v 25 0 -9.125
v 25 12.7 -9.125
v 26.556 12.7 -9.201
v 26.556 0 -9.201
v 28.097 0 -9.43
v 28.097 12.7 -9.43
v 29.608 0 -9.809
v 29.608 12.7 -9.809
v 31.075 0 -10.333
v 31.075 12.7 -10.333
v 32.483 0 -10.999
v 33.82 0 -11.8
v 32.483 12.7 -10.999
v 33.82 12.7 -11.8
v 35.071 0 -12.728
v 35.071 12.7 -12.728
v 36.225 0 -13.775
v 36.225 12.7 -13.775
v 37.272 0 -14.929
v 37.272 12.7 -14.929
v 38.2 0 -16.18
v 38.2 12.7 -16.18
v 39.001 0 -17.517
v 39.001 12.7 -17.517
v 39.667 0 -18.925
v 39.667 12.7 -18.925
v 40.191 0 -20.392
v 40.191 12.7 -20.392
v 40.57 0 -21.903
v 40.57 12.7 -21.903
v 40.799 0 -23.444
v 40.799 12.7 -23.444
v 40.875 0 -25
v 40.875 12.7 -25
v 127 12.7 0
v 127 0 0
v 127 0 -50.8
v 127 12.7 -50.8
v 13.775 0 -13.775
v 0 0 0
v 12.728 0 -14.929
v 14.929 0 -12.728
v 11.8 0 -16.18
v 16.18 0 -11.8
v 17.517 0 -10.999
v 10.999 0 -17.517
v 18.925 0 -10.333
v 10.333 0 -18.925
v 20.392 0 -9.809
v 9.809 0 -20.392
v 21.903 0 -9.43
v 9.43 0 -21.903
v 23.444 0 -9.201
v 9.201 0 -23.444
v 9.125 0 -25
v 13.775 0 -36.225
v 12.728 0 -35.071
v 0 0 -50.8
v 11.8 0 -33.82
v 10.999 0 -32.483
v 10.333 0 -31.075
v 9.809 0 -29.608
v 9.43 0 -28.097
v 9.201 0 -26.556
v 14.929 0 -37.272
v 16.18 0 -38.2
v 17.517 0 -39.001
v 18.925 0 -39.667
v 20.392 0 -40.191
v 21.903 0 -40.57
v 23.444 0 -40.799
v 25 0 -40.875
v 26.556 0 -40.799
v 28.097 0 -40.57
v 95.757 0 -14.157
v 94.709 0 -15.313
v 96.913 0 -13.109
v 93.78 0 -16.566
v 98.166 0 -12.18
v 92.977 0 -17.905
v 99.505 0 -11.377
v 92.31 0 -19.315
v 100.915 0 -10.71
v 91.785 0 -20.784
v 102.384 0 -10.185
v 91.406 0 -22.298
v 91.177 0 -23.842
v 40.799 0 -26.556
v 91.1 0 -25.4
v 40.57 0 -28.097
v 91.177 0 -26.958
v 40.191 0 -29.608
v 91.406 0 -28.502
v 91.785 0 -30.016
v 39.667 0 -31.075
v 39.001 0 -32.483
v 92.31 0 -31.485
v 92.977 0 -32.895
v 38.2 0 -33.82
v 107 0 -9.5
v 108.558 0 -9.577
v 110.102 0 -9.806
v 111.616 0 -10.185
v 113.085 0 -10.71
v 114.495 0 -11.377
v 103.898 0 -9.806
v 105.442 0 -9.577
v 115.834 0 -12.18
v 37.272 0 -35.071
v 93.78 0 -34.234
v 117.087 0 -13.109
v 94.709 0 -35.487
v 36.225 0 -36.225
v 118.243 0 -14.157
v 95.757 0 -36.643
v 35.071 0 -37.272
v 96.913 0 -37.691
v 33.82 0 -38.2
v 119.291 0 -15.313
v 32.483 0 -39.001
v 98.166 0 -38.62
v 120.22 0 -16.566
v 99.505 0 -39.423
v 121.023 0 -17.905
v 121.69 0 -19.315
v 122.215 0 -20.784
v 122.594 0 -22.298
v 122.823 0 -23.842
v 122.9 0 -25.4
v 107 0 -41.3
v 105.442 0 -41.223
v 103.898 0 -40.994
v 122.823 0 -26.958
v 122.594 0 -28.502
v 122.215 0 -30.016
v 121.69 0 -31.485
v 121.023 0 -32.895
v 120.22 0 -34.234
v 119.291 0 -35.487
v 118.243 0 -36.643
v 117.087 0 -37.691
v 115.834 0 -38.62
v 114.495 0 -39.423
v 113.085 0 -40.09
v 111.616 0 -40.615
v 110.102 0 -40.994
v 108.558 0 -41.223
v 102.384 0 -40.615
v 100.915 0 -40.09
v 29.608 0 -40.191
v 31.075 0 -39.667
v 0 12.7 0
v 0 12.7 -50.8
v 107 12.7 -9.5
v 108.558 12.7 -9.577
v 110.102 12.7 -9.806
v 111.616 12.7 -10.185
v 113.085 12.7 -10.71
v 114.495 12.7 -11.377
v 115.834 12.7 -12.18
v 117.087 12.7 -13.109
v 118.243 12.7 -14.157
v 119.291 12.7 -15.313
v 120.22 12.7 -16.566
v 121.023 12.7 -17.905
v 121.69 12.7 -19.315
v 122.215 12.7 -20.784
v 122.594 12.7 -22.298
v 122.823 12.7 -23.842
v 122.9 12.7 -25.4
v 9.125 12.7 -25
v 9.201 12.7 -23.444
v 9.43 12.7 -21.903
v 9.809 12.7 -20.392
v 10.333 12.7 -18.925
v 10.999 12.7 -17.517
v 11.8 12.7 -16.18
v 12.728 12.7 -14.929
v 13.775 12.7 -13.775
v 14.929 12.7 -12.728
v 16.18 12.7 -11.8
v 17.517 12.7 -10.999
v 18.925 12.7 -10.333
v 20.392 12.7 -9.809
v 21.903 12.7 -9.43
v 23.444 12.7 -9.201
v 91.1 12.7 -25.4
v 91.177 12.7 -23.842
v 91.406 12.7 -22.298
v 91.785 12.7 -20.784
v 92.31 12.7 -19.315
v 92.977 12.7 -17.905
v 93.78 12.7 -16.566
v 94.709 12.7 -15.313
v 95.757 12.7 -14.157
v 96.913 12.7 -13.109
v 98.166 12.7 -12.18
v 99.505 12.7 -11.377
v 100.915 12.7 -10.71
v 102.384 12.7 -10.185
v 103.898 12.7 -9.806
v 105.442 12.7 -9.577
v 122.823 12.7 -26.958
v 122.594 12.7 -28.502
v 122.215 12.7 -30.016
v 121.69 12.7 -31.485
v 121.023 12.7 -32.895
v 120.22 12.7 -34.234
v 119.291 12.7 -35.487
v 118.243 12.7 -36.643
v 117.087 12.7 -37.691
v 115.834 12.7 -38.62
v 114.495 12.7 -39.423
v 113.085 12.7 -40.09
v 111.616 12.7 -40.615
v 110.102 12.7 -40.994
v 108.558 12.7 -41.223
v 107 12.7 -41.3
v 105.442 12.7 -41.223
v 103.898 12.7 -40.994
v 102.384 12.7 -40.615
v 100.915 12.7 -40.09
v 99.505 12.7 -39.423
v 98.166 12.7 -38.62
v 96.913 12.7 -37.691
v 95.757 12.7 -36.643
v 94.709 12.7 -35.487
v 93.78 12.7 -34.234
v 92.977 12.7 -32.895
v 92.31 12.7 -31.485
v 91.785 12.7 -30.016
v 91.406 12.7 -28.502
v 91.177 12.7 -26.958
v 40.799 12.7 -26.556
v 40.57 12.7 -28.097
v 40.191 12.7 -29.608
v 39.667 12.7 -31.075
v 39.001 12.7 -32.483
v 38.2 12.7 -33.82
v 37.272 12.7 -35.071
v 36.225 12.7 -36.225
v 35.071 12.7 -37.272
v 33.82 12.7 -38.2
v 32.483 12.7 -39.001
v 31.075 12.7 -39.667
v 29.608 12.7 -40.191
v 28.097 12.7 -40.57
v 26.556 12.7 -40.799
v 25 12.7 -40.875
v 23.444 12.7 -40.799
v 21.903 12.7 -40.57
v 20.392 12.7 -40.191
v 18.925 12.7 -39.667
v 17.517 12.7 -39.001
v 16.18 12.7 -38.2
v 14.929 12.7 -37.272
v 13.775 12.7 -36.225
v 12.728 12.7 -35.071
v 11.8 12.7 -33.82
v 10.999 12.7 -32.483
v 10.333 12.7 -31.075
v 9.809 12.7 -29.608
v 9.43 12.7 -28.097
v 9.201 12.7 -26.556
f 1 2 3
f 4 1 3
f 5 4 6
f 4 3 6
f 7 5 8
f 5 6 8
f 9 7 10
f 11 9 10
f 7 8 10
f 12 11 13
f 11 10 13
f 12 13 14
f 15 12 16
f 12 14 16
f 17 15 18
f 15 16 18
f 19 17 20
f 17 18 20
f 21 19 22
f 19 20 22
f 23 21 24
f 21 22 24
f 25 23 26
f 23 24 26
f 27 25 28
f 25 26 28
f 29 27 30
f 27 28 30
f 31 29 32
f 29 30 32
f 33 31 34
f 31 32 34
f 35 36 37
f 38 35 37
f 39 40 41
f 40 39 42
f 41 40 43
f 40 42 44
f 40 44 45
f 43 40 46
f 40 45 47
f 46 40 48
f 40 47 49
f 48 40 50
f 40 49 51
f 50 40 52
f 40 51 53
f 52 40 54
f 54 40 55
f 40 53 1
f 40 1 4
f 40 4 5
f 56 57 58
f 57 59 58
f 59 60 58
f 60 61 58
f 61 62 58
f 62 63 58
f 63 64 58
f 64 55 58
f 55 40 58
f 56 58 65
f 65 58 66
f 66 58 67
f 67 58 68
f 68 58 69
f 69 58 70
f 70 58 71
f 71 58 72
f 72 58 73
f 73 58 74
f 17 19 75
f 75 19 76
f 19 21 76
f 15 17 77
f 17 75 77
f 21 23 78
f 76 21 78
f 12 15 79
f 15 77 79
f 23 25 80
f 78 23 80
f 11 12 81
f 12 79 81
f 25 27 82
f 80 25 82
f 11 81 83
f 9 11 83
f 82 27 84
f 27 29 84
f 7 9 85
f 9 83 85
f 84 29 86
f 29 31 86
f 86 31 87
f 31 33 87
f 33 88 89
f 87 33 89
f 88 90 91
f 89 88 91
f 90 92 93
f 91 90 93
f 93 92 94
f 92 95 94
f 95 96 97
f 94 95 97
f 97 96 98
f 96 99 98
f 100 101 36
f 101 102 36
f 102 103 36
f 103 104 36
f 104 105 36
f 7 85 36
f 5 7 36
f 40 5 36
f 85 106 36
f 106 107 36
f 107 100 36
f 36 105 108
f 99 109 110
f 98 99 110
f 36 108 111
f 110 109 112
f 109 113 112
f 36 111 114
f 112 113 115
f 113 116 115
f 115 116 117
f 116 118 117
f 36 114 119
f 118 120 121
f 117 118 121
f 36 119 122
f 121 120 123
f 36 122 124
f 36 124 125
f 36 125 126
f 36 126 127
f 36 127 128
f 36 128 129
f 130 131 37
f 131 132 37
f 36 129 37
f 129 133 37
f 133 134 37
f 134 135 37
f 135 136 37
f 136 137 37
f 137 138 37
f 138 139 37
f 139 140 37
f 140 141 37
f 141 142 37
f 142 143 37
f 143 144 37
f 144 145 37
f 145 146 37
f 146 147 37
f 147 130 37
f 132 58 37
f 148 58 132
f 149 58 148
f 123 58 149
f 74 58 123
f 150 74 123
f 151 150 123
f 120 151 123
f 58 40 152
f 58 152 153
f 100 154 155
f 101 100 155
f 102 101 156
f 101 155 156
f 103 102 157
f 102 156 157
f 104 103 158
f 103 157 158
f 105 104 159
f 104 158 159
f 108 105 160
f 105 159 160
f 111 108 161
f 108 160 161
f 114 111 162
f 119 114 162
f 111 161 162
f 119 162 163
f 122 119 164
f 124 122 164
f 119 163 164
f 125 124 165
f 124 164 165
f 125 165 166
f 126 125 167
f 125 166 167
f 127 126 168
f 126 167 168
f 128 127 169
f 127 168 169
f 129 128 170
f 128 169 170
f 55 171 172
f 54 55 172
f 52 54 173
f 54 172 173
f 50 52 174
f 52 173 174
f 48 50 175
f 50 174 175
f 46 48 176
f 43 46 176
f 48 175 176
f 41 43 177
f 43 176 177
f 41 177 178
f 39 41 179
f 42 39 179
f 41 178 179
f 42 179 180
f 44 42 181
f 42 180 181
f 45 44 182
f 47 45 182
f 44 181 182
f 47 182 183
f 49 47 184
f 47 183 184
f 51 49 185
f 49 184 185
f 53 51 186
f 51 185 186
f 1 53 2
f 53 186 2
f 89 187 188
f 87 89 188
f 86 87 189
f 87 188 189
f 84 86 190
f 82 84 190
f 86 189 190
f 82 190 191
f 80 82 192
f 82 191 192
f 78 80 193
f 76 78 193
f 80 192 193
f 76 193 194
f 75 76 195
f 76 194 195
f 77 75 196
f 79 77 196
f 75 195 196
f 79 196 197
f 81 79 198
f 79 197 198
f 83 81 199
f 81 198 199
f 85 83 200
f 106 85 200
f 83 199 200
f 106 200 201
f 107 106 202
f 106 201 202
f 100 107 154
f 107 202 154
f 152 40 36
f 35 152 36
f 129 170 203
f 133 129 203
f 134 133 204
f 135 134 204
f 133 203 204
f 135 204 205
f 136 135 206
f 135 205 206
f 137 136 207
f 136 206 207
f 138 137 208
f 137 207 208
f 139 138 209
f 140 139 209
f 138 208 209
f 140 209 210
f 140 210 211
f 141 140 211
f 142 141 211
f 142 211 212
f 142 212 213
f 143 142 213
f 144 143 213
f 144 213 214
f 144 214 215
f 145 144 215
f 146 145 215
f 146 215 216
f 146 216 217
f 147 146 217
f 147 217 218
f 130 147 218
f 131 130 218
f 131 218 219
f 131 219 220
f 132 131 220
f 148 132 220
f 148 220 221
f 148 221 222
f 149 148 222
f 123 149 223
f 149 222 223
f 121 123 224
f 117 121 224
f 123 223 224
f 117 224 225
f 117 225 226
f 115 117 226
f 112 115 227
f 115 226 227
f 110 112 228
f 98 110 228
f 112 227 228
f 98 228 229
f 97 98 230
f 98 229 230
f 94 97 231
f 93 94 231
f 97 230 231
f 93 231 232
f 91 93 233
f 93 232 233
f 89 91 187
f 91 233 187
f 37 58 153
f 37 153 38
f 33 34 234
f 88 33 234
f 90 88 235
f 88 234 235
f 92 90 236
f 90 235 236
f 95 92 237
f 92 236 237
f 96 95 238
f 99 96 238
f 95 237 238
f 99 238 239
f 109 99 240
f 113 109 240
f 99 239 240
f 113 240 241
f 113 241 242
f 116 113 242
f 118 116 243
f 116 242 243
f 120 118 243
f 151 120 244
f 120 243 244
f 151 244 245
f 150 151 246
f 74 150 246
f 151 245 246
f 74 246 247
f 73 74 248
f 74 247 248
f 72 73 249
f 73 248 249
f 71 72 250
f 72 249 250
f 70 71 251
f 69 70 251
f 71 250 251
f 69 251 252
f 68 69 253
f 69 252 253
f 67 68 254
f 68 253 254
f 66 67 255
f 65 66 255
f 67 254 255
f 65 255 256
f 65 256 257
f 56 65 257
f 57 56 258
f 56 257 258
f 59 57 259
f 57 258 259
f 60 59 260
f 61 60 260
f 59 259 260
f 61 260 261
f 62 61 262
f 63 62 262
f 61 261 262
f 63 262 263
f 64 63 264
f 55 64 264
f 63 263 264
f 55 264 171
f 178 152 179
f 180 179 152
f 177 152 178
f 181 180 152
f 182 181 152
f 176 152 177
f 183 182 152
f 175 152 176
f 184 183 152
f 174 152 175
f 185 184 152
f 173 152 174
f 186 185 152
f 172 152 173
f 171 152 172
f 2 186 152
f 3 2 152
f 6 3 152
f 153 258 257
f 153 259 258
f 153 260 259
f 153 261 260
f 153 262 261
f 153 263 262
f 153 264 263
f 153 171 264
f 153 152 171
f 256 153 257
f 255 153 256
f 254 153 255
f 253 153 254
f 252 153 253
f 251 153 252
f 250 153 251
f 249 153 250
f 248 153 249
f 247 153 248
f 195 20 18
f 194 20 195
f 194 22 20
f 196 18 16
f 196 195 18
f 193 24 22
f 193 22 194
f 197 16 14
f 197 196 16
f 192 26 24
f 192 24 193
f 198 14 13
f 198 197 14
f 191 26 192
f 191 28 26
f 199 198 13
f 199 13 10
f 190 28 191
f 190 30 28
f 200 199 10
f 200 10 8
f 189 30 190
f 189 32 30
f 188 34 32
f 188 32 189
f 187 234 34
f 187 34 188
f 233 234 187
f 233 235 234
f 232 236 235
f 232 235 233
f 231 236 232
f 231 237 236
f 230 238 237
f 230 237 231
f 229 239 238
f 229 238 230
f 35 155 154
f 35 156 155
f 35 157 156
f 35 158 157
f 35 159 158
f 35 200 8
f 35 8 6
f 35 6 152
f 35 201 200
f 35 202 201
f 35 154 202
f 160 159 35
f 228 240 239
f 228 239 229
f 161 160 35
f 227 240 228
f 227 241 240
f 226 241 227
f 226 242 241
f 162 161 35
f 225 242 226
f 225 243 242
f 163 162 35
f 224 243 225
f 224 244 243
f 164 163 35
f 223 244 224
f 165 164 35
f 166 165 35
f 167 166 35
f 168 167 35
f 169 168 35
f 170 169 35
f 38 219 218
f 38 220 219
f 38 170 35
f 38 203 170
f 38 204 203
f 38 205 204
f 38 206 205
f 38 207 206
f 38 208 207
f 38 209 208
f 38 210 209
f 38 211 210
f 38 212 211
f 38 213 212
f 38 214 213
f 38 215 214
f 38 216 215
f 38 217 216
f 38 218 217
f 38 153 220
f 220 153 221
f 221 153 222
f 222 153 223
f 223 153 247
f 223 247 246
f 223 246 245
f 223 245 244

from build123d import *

# Parameters (mm, degrees)
SKETCH1_W           = 127
SKETCH1_H           = 50.8
BOSS_EXTRUDE1_DEPTH = 12.7
CUT_EXTRUDE1_DEPTH  = 12.7
CUT_EXTRUDE2_DEPTH  = 13.7


with BuildPart() as part:
    # Sketch1 → Boss-Extrude1 (new body)
    with BuildSketch(Plane(origin=(0, 0, 0), x_dir=(1, 0, 0), z_dir=(0, 1, 0))):
        with Locations((63.5, 25.4)):
            Rectangle(SKETCH1_W, SKETCH1_H)
    extrude(amount=BOSS_EXTRUDE1_DEPTH)

    # Sketch2 → Cut-Extrude1 (cut)
    with BuildSketch(Plane(origin=(0, 12.7, 0), x_dir=(1, 0, 0), z_dir=(0, 1, 0))):
        with BuildLine():
            ThreePointArc((9.125, 25), (13.774679849, 13.774679849), (25, 9.125))
            Line((25, 9.125), (25, 25))
            Line((25, 25), (9.125, 25))
        make_face()
        with BuildLine():
            Line((25, 25), (25, 9.125))
            ThreePointArc((25, 9.125), (36.225320151, 13.774679849), (40.875, 25))
            ThreePointArc((40.875, 25), (25, 40.875), (9.125, 25))
            Line((9.125, 25), (25, 25))
        make_face()
    extrude(amount=-CUT_EXTRUDE1_DEPTH, mode=Mode.SUBTRACT)

    # Sketch4 → Cut-Extrude2 (cut, through all)
    with BuildSketch(Plane(origin=(0, 12.7, 0), x_dir=(1, 0, 0), z_dir=(0, 1, 0))):
        with BuildLine():
            ThreePointArc((91.1, 25.4), (95.757002179, 14.157002179), (107, 9.5))
            Line((107, 9.5), (107, 25.4))
            Line((107, 25.4), (91.1, 25.4))
        make_face()
        with BuildLine():
            Line((107, 25.4), (107, 9.5))
            ThreePointArc((107, 9.5), (118.242997821, 14.157002179), (122.9, 25.4))
            ThreePointArc((122.9, 25.4), (107, 41.3), (91.1, 25.4))
            Line((91.1, 25.4), (107, 25.4))
        make_face()
    extrude(amount=-CUT_EXTRUDE2_DEPTH, mode=Mode.SUBTRACT)


solid = part.part
